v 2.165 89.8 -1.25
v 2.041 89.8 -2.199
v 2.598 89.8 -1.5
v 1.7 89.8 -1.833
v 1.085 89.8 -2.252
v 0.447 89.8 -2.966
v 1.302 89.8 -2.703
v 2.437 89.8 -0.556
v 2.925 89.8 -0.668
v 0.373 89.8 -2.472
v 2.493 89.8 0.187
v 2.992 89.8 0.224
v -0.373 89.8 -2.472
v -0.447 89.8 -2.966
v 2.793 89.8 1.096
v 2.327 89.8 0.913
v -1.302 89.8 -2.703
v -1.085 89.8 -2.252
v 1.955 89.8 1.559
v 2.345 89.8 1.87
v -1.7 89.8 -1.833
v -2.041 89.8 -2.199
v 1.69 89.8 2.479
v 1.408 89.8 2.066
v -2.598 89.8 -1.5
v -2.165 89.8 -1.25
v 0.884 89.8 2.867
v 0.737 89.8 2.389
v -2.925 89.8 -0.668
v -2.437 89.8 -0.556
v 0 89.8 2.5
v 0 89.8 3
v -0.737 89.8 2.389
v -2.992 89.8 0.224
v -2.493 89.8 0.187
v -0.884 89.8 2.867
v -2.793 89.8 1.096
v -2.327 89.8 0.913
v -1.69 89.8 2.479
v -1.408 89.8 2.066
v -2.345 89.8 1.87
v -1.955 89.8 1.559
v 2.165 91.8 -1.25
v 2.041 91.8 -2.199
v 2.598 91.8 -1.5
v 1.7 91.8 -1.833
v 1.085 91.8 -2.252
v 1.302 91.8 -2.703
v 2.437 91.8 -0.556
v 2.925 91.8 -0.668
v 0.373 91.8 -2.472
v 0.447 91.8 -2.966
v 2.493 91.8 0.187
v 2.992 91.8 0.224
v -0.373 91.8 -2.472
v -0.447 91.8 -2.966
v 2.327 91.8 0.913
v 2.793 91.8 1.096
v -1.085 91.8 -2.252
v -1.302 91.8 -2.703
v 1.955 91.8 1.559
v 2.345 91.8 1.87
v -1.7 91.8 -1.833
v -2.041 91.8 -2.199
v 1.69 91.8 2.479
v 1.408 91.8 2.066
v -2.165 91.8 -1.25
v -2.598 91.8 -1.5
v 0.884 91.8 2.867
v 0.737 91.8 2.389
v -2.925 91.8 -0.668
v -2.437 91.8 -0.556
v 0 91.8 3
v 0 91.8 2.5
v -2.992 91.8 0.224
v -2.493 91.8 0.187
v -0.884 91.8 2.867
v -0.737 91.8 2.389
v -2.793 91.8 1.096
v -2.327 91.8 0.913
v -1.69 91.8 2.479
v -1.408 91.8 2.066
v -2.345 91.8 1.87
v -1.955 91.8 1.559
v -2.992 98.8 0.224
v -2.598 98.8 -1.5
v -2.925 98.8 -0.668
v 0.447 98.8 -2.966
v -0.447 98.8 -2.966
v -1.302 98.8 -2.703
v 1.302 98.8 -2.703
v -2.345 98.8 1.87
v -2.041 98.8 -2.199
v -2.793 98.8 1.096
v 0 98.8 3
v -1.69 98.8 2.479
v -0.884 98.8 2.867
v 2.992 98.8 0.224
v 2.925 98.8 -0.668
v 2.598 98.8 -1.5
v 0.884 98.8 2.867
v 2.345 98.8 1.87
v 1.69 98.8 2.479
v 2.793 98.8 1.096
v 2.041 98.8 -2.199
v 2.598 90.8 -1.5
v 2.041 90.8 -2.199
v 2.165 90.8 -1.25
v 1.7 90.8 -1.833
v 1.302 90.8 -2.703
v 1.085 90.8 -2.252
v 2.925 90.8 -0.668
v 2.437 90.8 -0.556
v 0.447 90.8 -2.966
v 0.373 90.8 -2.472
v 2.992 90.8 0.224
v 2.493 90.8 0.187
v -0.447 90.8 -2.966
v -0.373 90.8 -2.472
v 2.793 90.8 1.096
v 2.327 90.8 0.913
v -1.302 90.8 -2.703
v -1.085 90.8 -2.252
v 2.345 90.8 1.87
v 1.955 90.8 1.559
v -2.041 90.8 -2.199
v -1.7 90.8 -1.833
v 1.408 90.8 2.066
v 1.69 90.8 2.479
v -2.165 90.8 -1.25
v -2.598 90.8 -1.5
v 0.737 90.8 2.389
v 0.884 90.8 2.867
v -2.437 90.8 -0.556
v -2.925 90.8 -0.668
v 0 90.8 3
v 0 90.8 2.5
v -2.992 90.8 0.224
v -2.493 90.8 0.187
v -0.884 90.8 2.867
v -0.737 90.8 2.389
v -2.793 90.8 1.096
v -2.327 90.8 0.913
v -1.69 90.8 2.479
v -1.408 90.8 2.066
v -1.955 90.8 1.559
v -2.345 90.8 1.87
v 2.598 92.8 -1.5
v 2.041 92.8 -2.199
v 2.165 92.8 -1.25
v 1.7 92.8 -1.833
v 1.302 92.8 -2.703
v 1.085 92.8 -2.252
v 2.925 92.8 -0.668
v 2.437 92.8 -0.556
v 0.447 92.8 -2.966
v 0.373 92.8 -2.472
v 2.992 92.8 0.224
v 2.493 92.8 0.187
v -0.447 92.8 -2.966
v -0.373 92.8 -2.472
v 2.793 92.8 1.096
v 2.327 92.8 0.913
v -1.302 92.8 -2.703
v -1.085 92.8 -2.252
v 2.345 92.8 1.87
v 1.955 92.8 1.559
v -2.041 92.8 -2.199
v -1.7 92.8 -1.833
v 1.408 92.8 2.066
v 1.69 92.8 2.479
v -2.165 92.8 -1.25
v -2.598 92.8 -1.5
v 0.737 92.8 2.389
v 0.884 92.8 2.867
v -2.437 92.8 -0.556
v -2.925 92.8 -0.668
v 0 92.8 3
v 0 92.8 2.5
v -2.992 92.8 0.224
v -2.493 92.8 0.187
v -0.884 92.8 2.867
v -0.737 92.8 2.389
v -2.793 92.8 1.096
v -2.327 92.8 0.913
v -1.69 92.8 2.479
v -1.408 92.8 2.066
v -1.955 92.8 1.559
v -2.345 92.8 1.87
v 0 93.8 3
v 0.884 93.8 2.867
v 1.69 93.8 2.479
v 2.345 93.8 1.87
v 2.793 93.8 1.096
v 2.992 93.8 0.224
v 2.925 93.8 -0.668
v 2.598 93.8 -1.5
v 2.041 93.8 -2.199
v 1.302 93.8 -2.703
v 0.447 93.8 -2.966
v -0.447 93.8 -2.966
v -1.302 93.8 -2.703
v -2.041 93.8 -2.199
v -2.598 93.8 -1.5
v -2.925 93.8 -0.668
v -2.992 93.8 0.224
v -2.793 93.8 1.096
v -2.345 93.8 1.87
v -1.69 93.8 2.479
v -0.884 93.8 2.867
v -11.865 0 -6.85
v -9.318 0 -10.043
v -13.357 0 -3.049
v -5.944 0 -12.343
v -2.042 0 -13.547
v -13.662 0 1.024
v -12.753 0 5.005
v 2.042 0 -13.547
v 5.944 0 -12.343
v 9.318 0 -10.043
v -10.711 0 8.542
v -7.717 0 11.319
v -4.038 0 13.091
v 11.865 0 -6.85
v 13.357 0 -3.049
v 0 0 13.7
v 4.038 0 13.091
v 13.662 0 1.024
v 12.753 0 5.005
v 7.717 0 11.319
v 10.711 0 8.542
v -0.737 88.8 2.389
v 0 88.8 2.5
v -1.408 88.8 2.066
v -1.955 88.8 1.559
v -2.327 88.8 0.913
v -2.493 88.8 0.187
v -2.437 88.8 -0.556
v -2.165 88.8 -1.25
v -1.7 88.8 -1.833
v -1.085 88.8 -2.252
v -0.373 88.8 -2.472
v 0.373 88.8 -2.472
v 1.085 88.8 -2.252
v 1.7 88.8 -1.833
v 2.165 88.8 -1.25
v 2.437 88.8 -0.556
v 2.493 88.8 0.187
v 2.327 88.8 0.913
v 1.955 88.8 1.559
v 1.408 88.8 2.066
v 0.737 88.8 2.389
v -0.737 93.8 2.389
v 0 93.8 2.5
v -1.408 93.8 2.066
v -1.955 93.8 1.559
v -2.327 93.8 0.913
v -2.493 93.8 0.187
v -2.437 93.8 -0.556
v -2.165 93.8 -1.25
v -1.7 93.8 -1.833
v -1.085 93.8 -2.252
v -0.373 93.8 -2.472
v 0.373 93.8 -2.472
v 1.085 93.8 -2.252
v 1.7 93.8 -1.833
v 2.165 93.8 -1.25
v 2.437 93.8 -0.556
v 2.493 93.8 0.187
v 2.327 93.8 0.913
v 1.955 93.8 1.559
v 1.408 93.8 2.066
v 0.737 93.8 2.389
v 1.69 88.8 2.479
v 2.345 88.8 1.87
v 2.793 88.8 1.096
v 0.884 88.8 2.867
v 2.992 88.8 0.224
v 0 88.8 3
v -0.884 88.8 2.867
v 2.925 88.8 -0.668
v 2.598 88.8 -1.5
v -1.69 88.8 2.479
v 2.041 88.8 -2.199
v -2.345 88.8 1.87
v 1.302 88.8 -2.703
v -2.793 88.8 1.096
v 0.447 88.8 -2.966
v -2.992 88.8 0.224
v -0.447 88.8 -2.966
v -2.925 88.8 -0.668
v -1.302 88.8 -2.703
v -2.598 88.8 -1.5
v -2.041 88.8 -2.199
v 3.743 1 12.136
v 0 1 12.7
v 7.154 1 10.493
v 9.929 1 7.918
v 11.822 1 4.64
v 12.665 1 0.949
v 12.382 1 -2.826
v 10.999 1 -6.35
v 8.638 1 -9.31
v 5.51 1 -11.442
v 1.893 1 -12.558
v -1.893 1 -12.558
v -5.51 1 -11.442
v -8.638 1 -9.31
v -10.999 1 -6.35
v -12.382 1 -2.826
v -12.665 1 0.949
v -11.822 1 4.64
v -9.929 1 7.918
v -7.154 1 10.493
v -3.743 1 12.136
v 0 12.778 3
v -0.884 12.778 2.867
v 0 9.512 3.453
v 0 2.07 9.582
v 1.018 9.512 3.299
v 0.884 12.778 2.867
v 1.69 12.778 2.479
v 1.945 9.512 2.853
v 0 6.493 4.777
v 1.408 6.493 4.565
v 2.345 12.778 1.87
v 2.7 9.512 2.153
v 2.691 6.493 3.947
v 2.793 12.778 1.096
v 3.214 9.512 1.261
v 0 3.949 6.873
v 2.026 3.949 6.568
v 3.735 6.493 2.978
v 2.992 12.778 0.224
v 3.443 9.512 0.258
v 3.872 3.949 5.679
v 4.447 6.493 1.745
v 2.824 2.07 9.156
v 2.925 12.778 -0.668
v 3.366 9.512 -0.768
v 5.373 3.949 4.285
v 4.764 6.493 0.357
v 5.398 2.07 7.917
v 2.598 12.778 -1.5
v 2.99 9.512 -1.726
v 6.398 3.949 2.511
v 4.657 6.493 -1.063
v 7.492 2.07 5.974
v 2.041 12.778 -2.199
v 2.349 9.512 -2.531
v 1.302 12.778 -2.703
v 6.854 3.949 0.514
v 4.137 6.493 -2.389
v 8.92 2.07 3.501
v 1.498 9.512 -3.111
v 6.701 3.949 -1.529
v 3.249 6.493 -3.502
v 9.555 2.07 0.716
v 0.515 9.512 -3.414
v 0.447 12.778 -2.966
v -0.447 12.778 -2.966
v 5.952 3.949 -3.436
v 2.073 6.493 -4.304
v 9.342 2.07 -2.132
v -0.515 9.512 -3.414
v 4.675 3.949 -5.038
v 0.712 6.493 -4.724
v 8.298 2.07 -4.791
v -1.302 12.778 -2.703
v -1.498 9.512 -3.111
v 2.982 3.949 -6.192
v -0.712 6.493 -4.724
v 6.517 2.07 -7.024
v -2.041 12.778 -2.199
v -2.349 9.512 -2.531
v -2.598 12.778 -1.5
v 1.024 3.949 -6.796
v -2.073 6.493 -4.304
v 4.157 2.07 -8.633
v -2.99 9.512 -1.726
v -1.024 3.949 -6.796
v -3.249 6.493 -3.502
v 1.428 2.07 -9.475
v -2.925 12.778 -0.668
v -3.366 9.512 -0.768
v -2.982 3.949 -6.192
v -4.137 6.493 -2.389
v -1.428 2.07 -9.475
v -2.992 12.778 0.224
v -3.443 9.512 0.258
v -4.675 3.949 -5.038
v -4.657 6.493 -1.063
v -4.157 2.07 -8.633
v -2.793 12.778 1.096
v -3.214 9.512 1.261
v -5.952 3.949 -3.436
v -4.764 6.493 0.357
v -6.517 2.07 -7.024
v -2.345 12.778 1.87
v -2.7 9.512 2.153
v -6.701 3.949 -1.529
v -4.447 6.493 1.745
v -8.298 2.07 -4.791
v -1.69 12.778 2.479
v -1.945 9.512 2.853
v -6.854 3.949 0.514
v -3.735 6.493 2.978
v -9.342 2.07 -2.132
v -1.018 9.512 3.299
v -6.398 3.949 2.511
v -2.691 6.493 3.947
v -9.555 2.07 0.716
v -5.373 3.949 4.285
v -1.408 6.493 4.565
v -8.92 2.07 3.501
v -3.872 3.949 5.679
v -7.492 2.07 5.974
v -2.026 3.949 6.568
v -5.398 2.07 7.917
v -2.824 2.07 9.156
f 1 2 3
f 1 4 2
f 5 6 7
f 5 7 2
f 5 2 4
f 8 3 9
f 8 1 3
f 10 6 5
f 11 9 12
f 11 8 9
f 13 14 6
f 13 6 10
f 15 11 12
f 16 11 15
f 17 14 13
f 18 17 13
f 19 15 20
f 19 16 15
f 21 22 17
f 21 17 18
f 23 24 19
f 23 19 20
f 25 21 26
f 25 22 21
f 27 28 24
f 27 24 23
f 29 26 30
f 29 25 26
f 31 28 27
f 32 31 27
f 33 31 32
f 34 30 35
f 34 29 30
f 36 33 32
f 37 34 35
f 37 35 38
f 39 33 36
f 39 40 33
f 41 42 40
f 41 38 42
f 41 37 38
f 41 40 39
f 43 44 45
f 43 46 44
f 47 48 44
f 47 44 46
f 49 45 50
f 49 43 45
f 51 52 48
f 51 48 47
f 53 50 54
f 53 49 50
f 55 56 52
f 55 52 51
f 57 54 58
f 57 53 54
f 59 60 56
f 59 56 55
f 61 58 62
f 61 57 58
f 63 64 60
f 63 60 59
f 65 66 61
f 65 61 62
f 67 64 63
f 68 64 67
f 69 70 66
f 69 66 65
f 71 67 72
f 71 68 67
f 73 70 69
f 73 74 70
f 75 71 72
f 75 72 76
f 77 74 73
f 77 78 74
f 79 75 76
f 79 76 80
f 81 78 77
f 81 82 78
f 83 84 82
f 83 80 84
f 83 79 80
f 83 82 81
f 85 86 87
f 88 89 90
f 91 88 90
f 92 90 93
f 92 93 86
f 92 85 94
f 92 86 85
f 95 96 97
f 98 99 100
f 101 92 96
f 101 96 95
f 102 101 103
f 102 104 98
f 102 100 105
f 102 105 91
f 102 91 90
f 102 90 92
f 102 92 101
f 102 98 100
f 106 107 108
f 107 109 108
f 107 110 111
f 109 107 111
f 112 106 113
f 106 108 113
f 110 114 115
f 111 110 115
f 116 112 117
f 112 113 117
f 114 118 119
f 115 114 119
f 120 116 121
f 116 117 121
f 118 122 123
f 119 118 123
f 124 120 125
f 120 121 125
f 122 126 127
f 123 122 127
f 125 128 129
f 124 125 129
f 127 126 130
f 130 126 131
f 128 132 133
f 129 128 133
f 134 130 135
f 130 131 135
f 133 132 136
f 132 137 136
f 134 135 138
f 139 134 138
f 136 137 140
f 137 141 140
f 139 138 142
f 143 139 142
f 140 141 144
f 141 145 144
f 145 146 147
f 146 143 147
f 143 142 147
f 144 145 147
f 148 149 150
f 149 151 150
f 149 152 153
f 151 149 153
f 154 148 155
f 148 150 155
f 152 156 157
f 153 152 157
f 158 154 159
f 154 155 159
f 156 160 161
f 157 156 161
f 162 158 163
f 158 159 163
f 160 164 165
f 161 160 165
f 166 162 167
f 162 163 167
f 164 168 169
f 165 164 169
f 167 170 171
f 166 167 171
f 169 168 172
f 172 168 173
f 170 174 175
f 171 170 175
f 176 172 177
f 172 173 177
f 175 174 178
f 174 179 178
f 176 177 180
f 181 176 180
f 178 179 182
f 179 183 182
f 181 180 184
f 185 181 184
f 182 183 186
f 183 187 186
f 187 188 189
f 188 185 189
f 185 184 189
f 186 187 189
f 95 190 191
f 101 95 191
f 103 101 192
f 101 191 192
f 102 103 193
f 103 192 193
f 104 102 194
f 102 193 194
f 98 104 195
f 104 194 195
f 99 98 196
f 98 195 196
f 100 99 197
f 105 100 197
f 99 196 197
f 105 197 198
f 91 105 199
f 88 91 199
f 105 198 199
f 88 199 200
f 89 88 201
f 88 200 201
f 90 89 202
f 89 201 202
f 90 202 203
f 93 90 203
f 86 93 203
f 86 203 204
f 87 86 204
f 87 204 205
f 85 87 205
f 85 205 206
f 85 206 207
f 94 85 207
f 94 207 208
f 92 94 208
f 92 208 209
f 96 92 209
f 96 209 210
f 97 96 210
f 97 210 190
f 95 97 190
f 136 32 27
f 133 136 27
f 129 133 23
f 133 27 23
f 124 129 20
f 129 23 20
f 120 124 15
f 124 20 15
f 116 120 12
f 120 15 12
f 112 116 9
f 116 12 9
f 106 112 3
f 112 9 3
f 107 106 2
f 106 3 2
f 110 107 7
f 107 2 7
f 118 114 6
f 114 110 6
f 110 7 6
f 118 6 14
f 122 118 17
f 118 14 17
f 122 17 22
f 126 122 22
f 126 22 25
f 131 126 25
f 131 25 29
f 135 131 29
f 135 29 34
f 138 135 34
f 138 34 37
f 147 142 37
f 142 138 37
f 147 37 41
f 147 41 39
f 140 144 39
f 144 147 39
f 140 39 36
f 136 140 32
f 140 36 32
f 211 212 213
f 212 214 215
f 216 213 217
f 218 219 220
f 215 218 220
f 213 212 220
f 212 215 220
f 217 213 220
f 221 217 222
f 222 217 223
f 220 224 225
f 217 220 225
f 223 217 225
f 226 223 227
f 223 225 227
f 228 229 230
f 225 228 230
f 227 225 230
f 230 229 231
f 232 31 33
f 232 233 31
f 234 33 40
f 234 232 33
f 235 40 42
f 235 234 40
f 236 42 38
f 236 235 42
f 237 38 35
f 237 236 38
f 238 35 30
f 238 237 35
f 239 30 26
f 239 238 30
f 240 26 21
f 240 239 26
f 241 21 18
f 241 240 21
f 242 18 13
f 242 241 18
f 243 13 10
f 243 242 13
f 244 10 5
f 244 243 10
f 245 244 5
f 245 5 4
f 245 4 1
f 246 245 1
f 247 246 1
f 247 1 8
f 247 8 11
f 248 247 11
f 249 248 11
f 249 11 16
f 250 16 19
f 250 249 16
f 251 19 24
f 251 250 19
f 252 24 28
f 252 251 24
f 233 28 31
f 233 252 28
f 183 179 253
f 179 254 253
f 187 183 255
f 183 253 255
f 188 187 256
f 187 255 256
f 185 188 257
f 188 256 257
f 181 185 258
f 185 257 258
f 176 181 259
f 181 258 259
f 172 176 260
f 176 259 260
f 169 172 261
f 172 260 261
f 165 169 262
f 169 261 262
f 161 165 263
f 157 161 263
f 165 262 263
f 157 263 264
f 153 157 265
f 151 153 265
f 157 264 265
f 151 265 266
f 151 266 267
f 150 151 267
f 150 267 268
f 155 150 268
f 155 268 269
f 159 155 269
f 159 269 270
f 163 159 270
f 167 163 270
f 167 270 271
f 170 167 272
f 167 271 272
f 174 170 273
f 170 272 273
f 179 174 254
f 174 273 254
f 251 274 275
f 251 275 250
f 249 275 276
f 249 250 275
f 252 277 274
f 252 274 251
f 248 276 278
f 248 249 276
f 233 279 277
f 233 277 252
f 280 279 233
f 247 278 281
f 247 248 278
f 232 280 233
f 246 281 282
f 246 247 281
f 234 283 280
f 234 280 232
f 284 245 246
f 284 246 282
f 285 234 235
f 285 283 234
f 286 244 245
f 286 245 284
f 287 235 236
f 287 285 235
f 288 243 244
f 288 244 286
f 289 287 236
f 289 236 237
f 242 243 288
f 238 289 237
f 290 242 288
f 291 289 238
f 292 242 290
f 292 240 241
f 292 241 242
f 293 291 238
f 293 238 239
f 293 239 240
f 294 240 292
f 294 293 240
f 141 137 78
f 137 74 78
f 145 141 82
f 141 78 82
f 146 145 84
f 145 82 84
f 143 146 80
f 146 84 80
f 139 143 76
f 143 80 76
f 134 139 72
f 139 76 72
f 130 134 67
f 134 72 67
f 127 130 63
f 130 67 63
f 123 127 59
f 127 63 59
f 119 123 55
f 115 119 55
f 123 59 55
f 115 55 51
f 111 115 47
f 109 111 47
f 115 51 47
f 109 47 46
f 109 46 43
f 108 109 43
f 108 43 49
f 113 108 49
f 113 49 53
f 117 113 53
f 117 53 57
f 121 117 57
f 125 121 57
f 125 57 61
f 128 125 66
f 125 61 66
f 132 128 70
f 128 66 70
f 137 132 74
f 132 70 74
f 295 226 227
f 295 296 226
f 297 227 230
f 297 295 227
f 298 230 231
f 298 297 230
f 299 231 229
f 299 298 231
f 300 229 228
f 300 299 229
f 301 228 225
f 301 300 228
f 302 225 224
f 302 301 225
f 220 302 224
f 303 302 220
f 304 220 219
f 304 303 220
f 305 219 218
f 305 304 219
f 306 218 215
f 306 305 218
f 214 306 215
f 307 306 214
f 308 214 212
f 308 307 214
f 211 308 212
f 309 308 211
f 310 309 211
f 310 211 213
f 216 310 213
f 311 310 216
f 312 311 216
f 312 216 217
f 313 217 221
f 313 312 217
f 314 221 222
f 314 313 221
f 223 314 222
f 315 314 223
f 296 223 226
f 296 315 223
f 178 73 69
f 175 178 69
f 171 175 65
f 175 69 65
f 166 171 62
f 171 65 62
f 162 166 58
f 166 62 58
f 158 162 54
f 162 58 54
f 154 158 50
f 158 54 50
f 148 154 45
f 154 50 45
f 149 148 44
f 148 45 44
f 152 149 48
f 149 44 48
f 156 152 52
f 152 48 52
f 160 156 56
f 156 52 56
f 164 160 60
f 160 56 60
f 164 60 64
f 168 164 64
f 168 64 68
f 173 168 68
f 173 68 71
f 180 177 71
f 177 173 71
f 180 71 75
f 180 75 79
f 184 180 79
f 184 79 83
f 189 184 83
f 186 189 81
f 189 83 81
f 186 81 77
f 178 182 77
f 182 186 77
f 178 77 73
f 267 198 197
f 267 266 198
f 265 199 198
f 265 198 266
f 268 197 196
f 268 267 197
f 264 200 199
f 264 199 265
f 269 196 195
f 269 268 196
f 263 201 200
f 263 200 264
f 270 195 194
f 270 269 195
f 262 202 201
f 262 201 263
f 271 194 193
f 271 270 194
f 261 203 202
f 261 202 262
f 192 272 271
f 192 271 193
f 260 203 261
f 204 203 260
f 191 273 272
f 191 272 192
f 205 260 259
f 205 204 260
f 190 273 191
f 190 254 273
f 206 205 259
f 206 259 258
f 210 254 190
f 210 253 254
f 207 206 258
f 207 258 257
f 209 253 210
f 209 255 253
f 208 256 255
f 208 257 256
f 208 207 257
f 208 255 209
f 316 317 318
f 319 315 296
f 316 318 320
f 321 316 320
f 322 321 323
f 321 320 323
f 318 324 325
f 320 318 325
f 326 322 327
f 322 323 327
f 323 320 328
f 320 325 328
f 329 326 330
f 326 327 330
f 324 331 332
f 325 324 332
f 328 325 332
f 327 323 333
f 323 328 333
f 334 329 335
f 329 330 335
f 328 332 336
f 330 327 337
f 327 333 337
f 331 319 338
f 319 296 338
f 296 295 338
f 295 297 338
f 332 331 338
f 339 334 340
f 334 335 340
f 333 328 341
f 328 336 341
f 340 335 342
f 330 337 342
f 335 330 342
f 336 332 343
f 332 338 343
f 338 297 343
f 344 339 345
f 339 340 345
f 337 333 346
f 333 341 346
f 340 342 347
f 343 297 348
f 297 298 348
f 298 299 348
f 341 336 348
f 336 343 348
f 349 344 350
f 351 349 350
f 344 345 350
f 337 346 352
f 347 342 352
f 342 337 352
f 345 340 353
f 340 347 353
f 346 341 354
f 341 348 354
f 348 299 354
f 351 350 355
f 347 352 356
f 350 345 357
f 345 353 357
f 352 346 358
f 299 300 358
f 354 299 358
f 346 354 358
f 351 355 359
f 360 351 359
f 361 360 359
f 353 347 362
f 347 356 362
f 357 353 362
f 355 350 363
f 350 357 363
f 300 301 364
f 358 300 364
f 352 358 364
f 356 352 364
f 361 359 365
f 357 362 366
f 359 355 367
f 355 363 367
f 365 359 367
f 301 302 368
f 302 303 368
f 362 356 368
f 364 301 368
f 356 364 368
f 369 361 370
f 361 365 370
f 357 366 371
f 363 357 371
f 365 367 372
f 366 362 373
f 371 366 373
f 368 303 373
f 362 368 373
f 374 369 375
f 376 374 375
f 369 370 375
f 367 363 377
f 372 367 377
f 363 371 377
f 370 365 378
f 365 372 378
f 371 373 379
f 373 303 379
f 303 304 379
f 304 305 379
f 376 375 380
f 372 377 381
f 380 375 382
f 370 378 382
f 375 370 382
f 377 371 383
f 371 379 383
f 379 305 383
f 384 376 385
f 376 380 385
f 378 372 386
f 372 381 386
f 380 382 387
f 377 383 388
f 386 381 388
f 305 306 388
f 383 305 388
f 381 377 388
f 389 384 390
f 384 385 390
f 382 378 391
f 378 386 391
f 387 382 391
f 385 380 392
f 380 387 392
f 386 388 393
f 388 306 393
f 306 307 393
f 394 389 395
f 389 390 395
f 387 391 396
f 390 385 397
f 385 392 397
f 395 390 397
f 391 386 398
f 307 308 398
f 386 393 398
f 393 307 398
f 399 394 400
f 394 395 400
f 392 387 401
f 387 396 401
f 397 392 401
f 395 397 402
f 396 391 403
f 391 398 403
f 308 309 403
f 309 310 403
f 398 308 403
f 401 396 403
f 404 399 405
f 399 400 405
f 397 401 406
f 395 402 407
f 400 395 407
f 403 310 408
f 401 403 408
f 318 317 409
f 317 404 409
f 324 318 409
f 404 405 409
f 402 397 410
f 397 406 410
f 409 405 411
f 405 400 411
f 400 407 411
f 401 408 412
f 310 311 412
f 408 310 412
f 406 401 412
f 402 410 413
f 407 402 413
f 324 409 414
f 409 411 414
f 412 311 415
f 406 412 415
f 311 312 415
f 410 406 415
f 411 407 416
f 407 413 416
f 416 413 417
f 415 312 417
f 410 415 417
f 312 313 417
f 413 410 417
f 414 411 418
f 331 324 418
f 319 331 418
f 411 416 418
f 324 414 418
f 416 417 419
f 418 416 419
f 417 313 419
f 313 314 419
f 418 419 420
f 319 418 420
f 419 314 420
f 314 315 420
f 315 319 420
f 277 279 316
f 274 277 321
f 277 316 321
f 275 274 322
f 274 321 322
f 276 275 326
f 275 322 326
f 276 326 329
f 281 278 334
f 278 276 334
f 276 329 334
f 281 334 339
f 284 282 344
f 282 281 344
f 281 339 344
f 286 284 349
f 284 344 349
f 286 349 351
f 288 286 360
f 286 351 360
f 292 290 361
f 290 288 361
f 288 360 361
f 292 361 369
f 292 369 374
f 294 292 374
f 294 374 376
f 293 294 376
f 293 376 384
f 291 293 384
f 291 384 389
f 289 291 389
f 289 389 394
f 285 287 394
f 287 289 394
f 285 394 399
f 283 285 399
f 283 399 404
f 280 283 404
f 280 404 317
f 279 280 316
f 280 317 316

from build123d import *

# Parameters (mm, degrees)
SKETCH1_R           = 13.7
BOSS_EXTRUDE1_DEPTH = 1
CHAMFER2_SIZE       = 1
SKETCH4_R           = 3
BOSS_EXTRUDE2_DEPTH = 97.8
FILLET1_R           = 12
SKETCH5_W           = 0.49999999999999956
SKETCH5_H           = 1


# Some blends are built 0.0001 mm under size
with BuildPart() as part:
    # Sketch1 → Boss-Extrude1 (new body)
    with BuildSketch(Plane(origin=(0, 0, 0), x_dir=(1, 0, 0), z_dir=(0, 1, 0))):
        with Locations(Location((0, 0, 0), (0, 0, 270))):
            Circle(SKETCH1_R)
    extrude(amount=BOSS_EXTRUDE1_DEPTH)

    # Chamfer2
    chamfer2_edges = [part.edges().sort_by_distance(p)[0] for p in [
        (4.19e-15, 1, -13.7),
    ]]
    chamfer(chamfer2_edges, length=CHAMFER2_SIZE - 0.0001)  # a hair under: the kernel refuses the full size

    # Sketch4 → Boss-Extrude2 (add)
    with BuildSketch(Plane(origin=(0, 1, 0), x_dir=(1, 0, 0), z_dir=(0, 1, 0))):
        with Locations(Location((0, 0, 0), (0, 0, 270))):
            Circle(SKETCH4_R)
    extrude(amount=BOSS_EXTRUDE2_DEPTH)

    # Fillet1
    # the kernel refuses this fillet: 12 mm, written as the material it adds along each edge
    with BuildSketch(Plane(origin=(0, 1, 0), x_dir=(-1.8e-16, 0, 1), z_dir=(-1, 0, -1.8e-16))) as fillet1_piece_1:
        with BuildLine():
            CenterArc((15, 11.777540489856218), FILLET1_R, 180, 78.95042152448133)
            Line((3, 11.777540489856218), (2.76, 11.777540489856218))
            Line((2.76, 11.777540489856218), (2.76, 0))
            Line((2.76, 0), (3, -0.24))
            ThreePointArc((3, -0.24), (7.850050000000809, -0.24), (12.65410200000165, -0.23555080978867193))
            Line((12.65410200000165, -0.23555080978867193), (12.700100000001617, 8.2867e-12))
        make_face()
    revolve(axis=Axis((0, 1, 0), (0, 1, 0)))

    # Sketch5 → Cut-Revolve1 (revolve, cut)
    with BuildSketch(Plane.XY, mode=Mode.PRIVATE) as cut_revolve1_sk:
        with Locations((-2.75, 93.30000000000001)):
            Rectangle(SKETCH5_W, SKETCH5_H)
        with Locations((-2.75, 91.3)):
            Rectangle(SKETCH5_W, SKETCH5_H)
        Polygon((-2.500000000000001, 89.8), (-2.5000000000000004, 88.79999999999998), (-3.0000000000000004, 88.79999999999998), (-3.0000000000000004, 89.8), align=None)
    revolve(cut_revolve1_sk.sketch.rotate(Axis((0, 98.8, 0), (0, -1, 0)), 270), axis=Axis((0, 98.8, 0), (0, -1, 0)), mode=Mode.SUBTRACT)


solid = part.part
